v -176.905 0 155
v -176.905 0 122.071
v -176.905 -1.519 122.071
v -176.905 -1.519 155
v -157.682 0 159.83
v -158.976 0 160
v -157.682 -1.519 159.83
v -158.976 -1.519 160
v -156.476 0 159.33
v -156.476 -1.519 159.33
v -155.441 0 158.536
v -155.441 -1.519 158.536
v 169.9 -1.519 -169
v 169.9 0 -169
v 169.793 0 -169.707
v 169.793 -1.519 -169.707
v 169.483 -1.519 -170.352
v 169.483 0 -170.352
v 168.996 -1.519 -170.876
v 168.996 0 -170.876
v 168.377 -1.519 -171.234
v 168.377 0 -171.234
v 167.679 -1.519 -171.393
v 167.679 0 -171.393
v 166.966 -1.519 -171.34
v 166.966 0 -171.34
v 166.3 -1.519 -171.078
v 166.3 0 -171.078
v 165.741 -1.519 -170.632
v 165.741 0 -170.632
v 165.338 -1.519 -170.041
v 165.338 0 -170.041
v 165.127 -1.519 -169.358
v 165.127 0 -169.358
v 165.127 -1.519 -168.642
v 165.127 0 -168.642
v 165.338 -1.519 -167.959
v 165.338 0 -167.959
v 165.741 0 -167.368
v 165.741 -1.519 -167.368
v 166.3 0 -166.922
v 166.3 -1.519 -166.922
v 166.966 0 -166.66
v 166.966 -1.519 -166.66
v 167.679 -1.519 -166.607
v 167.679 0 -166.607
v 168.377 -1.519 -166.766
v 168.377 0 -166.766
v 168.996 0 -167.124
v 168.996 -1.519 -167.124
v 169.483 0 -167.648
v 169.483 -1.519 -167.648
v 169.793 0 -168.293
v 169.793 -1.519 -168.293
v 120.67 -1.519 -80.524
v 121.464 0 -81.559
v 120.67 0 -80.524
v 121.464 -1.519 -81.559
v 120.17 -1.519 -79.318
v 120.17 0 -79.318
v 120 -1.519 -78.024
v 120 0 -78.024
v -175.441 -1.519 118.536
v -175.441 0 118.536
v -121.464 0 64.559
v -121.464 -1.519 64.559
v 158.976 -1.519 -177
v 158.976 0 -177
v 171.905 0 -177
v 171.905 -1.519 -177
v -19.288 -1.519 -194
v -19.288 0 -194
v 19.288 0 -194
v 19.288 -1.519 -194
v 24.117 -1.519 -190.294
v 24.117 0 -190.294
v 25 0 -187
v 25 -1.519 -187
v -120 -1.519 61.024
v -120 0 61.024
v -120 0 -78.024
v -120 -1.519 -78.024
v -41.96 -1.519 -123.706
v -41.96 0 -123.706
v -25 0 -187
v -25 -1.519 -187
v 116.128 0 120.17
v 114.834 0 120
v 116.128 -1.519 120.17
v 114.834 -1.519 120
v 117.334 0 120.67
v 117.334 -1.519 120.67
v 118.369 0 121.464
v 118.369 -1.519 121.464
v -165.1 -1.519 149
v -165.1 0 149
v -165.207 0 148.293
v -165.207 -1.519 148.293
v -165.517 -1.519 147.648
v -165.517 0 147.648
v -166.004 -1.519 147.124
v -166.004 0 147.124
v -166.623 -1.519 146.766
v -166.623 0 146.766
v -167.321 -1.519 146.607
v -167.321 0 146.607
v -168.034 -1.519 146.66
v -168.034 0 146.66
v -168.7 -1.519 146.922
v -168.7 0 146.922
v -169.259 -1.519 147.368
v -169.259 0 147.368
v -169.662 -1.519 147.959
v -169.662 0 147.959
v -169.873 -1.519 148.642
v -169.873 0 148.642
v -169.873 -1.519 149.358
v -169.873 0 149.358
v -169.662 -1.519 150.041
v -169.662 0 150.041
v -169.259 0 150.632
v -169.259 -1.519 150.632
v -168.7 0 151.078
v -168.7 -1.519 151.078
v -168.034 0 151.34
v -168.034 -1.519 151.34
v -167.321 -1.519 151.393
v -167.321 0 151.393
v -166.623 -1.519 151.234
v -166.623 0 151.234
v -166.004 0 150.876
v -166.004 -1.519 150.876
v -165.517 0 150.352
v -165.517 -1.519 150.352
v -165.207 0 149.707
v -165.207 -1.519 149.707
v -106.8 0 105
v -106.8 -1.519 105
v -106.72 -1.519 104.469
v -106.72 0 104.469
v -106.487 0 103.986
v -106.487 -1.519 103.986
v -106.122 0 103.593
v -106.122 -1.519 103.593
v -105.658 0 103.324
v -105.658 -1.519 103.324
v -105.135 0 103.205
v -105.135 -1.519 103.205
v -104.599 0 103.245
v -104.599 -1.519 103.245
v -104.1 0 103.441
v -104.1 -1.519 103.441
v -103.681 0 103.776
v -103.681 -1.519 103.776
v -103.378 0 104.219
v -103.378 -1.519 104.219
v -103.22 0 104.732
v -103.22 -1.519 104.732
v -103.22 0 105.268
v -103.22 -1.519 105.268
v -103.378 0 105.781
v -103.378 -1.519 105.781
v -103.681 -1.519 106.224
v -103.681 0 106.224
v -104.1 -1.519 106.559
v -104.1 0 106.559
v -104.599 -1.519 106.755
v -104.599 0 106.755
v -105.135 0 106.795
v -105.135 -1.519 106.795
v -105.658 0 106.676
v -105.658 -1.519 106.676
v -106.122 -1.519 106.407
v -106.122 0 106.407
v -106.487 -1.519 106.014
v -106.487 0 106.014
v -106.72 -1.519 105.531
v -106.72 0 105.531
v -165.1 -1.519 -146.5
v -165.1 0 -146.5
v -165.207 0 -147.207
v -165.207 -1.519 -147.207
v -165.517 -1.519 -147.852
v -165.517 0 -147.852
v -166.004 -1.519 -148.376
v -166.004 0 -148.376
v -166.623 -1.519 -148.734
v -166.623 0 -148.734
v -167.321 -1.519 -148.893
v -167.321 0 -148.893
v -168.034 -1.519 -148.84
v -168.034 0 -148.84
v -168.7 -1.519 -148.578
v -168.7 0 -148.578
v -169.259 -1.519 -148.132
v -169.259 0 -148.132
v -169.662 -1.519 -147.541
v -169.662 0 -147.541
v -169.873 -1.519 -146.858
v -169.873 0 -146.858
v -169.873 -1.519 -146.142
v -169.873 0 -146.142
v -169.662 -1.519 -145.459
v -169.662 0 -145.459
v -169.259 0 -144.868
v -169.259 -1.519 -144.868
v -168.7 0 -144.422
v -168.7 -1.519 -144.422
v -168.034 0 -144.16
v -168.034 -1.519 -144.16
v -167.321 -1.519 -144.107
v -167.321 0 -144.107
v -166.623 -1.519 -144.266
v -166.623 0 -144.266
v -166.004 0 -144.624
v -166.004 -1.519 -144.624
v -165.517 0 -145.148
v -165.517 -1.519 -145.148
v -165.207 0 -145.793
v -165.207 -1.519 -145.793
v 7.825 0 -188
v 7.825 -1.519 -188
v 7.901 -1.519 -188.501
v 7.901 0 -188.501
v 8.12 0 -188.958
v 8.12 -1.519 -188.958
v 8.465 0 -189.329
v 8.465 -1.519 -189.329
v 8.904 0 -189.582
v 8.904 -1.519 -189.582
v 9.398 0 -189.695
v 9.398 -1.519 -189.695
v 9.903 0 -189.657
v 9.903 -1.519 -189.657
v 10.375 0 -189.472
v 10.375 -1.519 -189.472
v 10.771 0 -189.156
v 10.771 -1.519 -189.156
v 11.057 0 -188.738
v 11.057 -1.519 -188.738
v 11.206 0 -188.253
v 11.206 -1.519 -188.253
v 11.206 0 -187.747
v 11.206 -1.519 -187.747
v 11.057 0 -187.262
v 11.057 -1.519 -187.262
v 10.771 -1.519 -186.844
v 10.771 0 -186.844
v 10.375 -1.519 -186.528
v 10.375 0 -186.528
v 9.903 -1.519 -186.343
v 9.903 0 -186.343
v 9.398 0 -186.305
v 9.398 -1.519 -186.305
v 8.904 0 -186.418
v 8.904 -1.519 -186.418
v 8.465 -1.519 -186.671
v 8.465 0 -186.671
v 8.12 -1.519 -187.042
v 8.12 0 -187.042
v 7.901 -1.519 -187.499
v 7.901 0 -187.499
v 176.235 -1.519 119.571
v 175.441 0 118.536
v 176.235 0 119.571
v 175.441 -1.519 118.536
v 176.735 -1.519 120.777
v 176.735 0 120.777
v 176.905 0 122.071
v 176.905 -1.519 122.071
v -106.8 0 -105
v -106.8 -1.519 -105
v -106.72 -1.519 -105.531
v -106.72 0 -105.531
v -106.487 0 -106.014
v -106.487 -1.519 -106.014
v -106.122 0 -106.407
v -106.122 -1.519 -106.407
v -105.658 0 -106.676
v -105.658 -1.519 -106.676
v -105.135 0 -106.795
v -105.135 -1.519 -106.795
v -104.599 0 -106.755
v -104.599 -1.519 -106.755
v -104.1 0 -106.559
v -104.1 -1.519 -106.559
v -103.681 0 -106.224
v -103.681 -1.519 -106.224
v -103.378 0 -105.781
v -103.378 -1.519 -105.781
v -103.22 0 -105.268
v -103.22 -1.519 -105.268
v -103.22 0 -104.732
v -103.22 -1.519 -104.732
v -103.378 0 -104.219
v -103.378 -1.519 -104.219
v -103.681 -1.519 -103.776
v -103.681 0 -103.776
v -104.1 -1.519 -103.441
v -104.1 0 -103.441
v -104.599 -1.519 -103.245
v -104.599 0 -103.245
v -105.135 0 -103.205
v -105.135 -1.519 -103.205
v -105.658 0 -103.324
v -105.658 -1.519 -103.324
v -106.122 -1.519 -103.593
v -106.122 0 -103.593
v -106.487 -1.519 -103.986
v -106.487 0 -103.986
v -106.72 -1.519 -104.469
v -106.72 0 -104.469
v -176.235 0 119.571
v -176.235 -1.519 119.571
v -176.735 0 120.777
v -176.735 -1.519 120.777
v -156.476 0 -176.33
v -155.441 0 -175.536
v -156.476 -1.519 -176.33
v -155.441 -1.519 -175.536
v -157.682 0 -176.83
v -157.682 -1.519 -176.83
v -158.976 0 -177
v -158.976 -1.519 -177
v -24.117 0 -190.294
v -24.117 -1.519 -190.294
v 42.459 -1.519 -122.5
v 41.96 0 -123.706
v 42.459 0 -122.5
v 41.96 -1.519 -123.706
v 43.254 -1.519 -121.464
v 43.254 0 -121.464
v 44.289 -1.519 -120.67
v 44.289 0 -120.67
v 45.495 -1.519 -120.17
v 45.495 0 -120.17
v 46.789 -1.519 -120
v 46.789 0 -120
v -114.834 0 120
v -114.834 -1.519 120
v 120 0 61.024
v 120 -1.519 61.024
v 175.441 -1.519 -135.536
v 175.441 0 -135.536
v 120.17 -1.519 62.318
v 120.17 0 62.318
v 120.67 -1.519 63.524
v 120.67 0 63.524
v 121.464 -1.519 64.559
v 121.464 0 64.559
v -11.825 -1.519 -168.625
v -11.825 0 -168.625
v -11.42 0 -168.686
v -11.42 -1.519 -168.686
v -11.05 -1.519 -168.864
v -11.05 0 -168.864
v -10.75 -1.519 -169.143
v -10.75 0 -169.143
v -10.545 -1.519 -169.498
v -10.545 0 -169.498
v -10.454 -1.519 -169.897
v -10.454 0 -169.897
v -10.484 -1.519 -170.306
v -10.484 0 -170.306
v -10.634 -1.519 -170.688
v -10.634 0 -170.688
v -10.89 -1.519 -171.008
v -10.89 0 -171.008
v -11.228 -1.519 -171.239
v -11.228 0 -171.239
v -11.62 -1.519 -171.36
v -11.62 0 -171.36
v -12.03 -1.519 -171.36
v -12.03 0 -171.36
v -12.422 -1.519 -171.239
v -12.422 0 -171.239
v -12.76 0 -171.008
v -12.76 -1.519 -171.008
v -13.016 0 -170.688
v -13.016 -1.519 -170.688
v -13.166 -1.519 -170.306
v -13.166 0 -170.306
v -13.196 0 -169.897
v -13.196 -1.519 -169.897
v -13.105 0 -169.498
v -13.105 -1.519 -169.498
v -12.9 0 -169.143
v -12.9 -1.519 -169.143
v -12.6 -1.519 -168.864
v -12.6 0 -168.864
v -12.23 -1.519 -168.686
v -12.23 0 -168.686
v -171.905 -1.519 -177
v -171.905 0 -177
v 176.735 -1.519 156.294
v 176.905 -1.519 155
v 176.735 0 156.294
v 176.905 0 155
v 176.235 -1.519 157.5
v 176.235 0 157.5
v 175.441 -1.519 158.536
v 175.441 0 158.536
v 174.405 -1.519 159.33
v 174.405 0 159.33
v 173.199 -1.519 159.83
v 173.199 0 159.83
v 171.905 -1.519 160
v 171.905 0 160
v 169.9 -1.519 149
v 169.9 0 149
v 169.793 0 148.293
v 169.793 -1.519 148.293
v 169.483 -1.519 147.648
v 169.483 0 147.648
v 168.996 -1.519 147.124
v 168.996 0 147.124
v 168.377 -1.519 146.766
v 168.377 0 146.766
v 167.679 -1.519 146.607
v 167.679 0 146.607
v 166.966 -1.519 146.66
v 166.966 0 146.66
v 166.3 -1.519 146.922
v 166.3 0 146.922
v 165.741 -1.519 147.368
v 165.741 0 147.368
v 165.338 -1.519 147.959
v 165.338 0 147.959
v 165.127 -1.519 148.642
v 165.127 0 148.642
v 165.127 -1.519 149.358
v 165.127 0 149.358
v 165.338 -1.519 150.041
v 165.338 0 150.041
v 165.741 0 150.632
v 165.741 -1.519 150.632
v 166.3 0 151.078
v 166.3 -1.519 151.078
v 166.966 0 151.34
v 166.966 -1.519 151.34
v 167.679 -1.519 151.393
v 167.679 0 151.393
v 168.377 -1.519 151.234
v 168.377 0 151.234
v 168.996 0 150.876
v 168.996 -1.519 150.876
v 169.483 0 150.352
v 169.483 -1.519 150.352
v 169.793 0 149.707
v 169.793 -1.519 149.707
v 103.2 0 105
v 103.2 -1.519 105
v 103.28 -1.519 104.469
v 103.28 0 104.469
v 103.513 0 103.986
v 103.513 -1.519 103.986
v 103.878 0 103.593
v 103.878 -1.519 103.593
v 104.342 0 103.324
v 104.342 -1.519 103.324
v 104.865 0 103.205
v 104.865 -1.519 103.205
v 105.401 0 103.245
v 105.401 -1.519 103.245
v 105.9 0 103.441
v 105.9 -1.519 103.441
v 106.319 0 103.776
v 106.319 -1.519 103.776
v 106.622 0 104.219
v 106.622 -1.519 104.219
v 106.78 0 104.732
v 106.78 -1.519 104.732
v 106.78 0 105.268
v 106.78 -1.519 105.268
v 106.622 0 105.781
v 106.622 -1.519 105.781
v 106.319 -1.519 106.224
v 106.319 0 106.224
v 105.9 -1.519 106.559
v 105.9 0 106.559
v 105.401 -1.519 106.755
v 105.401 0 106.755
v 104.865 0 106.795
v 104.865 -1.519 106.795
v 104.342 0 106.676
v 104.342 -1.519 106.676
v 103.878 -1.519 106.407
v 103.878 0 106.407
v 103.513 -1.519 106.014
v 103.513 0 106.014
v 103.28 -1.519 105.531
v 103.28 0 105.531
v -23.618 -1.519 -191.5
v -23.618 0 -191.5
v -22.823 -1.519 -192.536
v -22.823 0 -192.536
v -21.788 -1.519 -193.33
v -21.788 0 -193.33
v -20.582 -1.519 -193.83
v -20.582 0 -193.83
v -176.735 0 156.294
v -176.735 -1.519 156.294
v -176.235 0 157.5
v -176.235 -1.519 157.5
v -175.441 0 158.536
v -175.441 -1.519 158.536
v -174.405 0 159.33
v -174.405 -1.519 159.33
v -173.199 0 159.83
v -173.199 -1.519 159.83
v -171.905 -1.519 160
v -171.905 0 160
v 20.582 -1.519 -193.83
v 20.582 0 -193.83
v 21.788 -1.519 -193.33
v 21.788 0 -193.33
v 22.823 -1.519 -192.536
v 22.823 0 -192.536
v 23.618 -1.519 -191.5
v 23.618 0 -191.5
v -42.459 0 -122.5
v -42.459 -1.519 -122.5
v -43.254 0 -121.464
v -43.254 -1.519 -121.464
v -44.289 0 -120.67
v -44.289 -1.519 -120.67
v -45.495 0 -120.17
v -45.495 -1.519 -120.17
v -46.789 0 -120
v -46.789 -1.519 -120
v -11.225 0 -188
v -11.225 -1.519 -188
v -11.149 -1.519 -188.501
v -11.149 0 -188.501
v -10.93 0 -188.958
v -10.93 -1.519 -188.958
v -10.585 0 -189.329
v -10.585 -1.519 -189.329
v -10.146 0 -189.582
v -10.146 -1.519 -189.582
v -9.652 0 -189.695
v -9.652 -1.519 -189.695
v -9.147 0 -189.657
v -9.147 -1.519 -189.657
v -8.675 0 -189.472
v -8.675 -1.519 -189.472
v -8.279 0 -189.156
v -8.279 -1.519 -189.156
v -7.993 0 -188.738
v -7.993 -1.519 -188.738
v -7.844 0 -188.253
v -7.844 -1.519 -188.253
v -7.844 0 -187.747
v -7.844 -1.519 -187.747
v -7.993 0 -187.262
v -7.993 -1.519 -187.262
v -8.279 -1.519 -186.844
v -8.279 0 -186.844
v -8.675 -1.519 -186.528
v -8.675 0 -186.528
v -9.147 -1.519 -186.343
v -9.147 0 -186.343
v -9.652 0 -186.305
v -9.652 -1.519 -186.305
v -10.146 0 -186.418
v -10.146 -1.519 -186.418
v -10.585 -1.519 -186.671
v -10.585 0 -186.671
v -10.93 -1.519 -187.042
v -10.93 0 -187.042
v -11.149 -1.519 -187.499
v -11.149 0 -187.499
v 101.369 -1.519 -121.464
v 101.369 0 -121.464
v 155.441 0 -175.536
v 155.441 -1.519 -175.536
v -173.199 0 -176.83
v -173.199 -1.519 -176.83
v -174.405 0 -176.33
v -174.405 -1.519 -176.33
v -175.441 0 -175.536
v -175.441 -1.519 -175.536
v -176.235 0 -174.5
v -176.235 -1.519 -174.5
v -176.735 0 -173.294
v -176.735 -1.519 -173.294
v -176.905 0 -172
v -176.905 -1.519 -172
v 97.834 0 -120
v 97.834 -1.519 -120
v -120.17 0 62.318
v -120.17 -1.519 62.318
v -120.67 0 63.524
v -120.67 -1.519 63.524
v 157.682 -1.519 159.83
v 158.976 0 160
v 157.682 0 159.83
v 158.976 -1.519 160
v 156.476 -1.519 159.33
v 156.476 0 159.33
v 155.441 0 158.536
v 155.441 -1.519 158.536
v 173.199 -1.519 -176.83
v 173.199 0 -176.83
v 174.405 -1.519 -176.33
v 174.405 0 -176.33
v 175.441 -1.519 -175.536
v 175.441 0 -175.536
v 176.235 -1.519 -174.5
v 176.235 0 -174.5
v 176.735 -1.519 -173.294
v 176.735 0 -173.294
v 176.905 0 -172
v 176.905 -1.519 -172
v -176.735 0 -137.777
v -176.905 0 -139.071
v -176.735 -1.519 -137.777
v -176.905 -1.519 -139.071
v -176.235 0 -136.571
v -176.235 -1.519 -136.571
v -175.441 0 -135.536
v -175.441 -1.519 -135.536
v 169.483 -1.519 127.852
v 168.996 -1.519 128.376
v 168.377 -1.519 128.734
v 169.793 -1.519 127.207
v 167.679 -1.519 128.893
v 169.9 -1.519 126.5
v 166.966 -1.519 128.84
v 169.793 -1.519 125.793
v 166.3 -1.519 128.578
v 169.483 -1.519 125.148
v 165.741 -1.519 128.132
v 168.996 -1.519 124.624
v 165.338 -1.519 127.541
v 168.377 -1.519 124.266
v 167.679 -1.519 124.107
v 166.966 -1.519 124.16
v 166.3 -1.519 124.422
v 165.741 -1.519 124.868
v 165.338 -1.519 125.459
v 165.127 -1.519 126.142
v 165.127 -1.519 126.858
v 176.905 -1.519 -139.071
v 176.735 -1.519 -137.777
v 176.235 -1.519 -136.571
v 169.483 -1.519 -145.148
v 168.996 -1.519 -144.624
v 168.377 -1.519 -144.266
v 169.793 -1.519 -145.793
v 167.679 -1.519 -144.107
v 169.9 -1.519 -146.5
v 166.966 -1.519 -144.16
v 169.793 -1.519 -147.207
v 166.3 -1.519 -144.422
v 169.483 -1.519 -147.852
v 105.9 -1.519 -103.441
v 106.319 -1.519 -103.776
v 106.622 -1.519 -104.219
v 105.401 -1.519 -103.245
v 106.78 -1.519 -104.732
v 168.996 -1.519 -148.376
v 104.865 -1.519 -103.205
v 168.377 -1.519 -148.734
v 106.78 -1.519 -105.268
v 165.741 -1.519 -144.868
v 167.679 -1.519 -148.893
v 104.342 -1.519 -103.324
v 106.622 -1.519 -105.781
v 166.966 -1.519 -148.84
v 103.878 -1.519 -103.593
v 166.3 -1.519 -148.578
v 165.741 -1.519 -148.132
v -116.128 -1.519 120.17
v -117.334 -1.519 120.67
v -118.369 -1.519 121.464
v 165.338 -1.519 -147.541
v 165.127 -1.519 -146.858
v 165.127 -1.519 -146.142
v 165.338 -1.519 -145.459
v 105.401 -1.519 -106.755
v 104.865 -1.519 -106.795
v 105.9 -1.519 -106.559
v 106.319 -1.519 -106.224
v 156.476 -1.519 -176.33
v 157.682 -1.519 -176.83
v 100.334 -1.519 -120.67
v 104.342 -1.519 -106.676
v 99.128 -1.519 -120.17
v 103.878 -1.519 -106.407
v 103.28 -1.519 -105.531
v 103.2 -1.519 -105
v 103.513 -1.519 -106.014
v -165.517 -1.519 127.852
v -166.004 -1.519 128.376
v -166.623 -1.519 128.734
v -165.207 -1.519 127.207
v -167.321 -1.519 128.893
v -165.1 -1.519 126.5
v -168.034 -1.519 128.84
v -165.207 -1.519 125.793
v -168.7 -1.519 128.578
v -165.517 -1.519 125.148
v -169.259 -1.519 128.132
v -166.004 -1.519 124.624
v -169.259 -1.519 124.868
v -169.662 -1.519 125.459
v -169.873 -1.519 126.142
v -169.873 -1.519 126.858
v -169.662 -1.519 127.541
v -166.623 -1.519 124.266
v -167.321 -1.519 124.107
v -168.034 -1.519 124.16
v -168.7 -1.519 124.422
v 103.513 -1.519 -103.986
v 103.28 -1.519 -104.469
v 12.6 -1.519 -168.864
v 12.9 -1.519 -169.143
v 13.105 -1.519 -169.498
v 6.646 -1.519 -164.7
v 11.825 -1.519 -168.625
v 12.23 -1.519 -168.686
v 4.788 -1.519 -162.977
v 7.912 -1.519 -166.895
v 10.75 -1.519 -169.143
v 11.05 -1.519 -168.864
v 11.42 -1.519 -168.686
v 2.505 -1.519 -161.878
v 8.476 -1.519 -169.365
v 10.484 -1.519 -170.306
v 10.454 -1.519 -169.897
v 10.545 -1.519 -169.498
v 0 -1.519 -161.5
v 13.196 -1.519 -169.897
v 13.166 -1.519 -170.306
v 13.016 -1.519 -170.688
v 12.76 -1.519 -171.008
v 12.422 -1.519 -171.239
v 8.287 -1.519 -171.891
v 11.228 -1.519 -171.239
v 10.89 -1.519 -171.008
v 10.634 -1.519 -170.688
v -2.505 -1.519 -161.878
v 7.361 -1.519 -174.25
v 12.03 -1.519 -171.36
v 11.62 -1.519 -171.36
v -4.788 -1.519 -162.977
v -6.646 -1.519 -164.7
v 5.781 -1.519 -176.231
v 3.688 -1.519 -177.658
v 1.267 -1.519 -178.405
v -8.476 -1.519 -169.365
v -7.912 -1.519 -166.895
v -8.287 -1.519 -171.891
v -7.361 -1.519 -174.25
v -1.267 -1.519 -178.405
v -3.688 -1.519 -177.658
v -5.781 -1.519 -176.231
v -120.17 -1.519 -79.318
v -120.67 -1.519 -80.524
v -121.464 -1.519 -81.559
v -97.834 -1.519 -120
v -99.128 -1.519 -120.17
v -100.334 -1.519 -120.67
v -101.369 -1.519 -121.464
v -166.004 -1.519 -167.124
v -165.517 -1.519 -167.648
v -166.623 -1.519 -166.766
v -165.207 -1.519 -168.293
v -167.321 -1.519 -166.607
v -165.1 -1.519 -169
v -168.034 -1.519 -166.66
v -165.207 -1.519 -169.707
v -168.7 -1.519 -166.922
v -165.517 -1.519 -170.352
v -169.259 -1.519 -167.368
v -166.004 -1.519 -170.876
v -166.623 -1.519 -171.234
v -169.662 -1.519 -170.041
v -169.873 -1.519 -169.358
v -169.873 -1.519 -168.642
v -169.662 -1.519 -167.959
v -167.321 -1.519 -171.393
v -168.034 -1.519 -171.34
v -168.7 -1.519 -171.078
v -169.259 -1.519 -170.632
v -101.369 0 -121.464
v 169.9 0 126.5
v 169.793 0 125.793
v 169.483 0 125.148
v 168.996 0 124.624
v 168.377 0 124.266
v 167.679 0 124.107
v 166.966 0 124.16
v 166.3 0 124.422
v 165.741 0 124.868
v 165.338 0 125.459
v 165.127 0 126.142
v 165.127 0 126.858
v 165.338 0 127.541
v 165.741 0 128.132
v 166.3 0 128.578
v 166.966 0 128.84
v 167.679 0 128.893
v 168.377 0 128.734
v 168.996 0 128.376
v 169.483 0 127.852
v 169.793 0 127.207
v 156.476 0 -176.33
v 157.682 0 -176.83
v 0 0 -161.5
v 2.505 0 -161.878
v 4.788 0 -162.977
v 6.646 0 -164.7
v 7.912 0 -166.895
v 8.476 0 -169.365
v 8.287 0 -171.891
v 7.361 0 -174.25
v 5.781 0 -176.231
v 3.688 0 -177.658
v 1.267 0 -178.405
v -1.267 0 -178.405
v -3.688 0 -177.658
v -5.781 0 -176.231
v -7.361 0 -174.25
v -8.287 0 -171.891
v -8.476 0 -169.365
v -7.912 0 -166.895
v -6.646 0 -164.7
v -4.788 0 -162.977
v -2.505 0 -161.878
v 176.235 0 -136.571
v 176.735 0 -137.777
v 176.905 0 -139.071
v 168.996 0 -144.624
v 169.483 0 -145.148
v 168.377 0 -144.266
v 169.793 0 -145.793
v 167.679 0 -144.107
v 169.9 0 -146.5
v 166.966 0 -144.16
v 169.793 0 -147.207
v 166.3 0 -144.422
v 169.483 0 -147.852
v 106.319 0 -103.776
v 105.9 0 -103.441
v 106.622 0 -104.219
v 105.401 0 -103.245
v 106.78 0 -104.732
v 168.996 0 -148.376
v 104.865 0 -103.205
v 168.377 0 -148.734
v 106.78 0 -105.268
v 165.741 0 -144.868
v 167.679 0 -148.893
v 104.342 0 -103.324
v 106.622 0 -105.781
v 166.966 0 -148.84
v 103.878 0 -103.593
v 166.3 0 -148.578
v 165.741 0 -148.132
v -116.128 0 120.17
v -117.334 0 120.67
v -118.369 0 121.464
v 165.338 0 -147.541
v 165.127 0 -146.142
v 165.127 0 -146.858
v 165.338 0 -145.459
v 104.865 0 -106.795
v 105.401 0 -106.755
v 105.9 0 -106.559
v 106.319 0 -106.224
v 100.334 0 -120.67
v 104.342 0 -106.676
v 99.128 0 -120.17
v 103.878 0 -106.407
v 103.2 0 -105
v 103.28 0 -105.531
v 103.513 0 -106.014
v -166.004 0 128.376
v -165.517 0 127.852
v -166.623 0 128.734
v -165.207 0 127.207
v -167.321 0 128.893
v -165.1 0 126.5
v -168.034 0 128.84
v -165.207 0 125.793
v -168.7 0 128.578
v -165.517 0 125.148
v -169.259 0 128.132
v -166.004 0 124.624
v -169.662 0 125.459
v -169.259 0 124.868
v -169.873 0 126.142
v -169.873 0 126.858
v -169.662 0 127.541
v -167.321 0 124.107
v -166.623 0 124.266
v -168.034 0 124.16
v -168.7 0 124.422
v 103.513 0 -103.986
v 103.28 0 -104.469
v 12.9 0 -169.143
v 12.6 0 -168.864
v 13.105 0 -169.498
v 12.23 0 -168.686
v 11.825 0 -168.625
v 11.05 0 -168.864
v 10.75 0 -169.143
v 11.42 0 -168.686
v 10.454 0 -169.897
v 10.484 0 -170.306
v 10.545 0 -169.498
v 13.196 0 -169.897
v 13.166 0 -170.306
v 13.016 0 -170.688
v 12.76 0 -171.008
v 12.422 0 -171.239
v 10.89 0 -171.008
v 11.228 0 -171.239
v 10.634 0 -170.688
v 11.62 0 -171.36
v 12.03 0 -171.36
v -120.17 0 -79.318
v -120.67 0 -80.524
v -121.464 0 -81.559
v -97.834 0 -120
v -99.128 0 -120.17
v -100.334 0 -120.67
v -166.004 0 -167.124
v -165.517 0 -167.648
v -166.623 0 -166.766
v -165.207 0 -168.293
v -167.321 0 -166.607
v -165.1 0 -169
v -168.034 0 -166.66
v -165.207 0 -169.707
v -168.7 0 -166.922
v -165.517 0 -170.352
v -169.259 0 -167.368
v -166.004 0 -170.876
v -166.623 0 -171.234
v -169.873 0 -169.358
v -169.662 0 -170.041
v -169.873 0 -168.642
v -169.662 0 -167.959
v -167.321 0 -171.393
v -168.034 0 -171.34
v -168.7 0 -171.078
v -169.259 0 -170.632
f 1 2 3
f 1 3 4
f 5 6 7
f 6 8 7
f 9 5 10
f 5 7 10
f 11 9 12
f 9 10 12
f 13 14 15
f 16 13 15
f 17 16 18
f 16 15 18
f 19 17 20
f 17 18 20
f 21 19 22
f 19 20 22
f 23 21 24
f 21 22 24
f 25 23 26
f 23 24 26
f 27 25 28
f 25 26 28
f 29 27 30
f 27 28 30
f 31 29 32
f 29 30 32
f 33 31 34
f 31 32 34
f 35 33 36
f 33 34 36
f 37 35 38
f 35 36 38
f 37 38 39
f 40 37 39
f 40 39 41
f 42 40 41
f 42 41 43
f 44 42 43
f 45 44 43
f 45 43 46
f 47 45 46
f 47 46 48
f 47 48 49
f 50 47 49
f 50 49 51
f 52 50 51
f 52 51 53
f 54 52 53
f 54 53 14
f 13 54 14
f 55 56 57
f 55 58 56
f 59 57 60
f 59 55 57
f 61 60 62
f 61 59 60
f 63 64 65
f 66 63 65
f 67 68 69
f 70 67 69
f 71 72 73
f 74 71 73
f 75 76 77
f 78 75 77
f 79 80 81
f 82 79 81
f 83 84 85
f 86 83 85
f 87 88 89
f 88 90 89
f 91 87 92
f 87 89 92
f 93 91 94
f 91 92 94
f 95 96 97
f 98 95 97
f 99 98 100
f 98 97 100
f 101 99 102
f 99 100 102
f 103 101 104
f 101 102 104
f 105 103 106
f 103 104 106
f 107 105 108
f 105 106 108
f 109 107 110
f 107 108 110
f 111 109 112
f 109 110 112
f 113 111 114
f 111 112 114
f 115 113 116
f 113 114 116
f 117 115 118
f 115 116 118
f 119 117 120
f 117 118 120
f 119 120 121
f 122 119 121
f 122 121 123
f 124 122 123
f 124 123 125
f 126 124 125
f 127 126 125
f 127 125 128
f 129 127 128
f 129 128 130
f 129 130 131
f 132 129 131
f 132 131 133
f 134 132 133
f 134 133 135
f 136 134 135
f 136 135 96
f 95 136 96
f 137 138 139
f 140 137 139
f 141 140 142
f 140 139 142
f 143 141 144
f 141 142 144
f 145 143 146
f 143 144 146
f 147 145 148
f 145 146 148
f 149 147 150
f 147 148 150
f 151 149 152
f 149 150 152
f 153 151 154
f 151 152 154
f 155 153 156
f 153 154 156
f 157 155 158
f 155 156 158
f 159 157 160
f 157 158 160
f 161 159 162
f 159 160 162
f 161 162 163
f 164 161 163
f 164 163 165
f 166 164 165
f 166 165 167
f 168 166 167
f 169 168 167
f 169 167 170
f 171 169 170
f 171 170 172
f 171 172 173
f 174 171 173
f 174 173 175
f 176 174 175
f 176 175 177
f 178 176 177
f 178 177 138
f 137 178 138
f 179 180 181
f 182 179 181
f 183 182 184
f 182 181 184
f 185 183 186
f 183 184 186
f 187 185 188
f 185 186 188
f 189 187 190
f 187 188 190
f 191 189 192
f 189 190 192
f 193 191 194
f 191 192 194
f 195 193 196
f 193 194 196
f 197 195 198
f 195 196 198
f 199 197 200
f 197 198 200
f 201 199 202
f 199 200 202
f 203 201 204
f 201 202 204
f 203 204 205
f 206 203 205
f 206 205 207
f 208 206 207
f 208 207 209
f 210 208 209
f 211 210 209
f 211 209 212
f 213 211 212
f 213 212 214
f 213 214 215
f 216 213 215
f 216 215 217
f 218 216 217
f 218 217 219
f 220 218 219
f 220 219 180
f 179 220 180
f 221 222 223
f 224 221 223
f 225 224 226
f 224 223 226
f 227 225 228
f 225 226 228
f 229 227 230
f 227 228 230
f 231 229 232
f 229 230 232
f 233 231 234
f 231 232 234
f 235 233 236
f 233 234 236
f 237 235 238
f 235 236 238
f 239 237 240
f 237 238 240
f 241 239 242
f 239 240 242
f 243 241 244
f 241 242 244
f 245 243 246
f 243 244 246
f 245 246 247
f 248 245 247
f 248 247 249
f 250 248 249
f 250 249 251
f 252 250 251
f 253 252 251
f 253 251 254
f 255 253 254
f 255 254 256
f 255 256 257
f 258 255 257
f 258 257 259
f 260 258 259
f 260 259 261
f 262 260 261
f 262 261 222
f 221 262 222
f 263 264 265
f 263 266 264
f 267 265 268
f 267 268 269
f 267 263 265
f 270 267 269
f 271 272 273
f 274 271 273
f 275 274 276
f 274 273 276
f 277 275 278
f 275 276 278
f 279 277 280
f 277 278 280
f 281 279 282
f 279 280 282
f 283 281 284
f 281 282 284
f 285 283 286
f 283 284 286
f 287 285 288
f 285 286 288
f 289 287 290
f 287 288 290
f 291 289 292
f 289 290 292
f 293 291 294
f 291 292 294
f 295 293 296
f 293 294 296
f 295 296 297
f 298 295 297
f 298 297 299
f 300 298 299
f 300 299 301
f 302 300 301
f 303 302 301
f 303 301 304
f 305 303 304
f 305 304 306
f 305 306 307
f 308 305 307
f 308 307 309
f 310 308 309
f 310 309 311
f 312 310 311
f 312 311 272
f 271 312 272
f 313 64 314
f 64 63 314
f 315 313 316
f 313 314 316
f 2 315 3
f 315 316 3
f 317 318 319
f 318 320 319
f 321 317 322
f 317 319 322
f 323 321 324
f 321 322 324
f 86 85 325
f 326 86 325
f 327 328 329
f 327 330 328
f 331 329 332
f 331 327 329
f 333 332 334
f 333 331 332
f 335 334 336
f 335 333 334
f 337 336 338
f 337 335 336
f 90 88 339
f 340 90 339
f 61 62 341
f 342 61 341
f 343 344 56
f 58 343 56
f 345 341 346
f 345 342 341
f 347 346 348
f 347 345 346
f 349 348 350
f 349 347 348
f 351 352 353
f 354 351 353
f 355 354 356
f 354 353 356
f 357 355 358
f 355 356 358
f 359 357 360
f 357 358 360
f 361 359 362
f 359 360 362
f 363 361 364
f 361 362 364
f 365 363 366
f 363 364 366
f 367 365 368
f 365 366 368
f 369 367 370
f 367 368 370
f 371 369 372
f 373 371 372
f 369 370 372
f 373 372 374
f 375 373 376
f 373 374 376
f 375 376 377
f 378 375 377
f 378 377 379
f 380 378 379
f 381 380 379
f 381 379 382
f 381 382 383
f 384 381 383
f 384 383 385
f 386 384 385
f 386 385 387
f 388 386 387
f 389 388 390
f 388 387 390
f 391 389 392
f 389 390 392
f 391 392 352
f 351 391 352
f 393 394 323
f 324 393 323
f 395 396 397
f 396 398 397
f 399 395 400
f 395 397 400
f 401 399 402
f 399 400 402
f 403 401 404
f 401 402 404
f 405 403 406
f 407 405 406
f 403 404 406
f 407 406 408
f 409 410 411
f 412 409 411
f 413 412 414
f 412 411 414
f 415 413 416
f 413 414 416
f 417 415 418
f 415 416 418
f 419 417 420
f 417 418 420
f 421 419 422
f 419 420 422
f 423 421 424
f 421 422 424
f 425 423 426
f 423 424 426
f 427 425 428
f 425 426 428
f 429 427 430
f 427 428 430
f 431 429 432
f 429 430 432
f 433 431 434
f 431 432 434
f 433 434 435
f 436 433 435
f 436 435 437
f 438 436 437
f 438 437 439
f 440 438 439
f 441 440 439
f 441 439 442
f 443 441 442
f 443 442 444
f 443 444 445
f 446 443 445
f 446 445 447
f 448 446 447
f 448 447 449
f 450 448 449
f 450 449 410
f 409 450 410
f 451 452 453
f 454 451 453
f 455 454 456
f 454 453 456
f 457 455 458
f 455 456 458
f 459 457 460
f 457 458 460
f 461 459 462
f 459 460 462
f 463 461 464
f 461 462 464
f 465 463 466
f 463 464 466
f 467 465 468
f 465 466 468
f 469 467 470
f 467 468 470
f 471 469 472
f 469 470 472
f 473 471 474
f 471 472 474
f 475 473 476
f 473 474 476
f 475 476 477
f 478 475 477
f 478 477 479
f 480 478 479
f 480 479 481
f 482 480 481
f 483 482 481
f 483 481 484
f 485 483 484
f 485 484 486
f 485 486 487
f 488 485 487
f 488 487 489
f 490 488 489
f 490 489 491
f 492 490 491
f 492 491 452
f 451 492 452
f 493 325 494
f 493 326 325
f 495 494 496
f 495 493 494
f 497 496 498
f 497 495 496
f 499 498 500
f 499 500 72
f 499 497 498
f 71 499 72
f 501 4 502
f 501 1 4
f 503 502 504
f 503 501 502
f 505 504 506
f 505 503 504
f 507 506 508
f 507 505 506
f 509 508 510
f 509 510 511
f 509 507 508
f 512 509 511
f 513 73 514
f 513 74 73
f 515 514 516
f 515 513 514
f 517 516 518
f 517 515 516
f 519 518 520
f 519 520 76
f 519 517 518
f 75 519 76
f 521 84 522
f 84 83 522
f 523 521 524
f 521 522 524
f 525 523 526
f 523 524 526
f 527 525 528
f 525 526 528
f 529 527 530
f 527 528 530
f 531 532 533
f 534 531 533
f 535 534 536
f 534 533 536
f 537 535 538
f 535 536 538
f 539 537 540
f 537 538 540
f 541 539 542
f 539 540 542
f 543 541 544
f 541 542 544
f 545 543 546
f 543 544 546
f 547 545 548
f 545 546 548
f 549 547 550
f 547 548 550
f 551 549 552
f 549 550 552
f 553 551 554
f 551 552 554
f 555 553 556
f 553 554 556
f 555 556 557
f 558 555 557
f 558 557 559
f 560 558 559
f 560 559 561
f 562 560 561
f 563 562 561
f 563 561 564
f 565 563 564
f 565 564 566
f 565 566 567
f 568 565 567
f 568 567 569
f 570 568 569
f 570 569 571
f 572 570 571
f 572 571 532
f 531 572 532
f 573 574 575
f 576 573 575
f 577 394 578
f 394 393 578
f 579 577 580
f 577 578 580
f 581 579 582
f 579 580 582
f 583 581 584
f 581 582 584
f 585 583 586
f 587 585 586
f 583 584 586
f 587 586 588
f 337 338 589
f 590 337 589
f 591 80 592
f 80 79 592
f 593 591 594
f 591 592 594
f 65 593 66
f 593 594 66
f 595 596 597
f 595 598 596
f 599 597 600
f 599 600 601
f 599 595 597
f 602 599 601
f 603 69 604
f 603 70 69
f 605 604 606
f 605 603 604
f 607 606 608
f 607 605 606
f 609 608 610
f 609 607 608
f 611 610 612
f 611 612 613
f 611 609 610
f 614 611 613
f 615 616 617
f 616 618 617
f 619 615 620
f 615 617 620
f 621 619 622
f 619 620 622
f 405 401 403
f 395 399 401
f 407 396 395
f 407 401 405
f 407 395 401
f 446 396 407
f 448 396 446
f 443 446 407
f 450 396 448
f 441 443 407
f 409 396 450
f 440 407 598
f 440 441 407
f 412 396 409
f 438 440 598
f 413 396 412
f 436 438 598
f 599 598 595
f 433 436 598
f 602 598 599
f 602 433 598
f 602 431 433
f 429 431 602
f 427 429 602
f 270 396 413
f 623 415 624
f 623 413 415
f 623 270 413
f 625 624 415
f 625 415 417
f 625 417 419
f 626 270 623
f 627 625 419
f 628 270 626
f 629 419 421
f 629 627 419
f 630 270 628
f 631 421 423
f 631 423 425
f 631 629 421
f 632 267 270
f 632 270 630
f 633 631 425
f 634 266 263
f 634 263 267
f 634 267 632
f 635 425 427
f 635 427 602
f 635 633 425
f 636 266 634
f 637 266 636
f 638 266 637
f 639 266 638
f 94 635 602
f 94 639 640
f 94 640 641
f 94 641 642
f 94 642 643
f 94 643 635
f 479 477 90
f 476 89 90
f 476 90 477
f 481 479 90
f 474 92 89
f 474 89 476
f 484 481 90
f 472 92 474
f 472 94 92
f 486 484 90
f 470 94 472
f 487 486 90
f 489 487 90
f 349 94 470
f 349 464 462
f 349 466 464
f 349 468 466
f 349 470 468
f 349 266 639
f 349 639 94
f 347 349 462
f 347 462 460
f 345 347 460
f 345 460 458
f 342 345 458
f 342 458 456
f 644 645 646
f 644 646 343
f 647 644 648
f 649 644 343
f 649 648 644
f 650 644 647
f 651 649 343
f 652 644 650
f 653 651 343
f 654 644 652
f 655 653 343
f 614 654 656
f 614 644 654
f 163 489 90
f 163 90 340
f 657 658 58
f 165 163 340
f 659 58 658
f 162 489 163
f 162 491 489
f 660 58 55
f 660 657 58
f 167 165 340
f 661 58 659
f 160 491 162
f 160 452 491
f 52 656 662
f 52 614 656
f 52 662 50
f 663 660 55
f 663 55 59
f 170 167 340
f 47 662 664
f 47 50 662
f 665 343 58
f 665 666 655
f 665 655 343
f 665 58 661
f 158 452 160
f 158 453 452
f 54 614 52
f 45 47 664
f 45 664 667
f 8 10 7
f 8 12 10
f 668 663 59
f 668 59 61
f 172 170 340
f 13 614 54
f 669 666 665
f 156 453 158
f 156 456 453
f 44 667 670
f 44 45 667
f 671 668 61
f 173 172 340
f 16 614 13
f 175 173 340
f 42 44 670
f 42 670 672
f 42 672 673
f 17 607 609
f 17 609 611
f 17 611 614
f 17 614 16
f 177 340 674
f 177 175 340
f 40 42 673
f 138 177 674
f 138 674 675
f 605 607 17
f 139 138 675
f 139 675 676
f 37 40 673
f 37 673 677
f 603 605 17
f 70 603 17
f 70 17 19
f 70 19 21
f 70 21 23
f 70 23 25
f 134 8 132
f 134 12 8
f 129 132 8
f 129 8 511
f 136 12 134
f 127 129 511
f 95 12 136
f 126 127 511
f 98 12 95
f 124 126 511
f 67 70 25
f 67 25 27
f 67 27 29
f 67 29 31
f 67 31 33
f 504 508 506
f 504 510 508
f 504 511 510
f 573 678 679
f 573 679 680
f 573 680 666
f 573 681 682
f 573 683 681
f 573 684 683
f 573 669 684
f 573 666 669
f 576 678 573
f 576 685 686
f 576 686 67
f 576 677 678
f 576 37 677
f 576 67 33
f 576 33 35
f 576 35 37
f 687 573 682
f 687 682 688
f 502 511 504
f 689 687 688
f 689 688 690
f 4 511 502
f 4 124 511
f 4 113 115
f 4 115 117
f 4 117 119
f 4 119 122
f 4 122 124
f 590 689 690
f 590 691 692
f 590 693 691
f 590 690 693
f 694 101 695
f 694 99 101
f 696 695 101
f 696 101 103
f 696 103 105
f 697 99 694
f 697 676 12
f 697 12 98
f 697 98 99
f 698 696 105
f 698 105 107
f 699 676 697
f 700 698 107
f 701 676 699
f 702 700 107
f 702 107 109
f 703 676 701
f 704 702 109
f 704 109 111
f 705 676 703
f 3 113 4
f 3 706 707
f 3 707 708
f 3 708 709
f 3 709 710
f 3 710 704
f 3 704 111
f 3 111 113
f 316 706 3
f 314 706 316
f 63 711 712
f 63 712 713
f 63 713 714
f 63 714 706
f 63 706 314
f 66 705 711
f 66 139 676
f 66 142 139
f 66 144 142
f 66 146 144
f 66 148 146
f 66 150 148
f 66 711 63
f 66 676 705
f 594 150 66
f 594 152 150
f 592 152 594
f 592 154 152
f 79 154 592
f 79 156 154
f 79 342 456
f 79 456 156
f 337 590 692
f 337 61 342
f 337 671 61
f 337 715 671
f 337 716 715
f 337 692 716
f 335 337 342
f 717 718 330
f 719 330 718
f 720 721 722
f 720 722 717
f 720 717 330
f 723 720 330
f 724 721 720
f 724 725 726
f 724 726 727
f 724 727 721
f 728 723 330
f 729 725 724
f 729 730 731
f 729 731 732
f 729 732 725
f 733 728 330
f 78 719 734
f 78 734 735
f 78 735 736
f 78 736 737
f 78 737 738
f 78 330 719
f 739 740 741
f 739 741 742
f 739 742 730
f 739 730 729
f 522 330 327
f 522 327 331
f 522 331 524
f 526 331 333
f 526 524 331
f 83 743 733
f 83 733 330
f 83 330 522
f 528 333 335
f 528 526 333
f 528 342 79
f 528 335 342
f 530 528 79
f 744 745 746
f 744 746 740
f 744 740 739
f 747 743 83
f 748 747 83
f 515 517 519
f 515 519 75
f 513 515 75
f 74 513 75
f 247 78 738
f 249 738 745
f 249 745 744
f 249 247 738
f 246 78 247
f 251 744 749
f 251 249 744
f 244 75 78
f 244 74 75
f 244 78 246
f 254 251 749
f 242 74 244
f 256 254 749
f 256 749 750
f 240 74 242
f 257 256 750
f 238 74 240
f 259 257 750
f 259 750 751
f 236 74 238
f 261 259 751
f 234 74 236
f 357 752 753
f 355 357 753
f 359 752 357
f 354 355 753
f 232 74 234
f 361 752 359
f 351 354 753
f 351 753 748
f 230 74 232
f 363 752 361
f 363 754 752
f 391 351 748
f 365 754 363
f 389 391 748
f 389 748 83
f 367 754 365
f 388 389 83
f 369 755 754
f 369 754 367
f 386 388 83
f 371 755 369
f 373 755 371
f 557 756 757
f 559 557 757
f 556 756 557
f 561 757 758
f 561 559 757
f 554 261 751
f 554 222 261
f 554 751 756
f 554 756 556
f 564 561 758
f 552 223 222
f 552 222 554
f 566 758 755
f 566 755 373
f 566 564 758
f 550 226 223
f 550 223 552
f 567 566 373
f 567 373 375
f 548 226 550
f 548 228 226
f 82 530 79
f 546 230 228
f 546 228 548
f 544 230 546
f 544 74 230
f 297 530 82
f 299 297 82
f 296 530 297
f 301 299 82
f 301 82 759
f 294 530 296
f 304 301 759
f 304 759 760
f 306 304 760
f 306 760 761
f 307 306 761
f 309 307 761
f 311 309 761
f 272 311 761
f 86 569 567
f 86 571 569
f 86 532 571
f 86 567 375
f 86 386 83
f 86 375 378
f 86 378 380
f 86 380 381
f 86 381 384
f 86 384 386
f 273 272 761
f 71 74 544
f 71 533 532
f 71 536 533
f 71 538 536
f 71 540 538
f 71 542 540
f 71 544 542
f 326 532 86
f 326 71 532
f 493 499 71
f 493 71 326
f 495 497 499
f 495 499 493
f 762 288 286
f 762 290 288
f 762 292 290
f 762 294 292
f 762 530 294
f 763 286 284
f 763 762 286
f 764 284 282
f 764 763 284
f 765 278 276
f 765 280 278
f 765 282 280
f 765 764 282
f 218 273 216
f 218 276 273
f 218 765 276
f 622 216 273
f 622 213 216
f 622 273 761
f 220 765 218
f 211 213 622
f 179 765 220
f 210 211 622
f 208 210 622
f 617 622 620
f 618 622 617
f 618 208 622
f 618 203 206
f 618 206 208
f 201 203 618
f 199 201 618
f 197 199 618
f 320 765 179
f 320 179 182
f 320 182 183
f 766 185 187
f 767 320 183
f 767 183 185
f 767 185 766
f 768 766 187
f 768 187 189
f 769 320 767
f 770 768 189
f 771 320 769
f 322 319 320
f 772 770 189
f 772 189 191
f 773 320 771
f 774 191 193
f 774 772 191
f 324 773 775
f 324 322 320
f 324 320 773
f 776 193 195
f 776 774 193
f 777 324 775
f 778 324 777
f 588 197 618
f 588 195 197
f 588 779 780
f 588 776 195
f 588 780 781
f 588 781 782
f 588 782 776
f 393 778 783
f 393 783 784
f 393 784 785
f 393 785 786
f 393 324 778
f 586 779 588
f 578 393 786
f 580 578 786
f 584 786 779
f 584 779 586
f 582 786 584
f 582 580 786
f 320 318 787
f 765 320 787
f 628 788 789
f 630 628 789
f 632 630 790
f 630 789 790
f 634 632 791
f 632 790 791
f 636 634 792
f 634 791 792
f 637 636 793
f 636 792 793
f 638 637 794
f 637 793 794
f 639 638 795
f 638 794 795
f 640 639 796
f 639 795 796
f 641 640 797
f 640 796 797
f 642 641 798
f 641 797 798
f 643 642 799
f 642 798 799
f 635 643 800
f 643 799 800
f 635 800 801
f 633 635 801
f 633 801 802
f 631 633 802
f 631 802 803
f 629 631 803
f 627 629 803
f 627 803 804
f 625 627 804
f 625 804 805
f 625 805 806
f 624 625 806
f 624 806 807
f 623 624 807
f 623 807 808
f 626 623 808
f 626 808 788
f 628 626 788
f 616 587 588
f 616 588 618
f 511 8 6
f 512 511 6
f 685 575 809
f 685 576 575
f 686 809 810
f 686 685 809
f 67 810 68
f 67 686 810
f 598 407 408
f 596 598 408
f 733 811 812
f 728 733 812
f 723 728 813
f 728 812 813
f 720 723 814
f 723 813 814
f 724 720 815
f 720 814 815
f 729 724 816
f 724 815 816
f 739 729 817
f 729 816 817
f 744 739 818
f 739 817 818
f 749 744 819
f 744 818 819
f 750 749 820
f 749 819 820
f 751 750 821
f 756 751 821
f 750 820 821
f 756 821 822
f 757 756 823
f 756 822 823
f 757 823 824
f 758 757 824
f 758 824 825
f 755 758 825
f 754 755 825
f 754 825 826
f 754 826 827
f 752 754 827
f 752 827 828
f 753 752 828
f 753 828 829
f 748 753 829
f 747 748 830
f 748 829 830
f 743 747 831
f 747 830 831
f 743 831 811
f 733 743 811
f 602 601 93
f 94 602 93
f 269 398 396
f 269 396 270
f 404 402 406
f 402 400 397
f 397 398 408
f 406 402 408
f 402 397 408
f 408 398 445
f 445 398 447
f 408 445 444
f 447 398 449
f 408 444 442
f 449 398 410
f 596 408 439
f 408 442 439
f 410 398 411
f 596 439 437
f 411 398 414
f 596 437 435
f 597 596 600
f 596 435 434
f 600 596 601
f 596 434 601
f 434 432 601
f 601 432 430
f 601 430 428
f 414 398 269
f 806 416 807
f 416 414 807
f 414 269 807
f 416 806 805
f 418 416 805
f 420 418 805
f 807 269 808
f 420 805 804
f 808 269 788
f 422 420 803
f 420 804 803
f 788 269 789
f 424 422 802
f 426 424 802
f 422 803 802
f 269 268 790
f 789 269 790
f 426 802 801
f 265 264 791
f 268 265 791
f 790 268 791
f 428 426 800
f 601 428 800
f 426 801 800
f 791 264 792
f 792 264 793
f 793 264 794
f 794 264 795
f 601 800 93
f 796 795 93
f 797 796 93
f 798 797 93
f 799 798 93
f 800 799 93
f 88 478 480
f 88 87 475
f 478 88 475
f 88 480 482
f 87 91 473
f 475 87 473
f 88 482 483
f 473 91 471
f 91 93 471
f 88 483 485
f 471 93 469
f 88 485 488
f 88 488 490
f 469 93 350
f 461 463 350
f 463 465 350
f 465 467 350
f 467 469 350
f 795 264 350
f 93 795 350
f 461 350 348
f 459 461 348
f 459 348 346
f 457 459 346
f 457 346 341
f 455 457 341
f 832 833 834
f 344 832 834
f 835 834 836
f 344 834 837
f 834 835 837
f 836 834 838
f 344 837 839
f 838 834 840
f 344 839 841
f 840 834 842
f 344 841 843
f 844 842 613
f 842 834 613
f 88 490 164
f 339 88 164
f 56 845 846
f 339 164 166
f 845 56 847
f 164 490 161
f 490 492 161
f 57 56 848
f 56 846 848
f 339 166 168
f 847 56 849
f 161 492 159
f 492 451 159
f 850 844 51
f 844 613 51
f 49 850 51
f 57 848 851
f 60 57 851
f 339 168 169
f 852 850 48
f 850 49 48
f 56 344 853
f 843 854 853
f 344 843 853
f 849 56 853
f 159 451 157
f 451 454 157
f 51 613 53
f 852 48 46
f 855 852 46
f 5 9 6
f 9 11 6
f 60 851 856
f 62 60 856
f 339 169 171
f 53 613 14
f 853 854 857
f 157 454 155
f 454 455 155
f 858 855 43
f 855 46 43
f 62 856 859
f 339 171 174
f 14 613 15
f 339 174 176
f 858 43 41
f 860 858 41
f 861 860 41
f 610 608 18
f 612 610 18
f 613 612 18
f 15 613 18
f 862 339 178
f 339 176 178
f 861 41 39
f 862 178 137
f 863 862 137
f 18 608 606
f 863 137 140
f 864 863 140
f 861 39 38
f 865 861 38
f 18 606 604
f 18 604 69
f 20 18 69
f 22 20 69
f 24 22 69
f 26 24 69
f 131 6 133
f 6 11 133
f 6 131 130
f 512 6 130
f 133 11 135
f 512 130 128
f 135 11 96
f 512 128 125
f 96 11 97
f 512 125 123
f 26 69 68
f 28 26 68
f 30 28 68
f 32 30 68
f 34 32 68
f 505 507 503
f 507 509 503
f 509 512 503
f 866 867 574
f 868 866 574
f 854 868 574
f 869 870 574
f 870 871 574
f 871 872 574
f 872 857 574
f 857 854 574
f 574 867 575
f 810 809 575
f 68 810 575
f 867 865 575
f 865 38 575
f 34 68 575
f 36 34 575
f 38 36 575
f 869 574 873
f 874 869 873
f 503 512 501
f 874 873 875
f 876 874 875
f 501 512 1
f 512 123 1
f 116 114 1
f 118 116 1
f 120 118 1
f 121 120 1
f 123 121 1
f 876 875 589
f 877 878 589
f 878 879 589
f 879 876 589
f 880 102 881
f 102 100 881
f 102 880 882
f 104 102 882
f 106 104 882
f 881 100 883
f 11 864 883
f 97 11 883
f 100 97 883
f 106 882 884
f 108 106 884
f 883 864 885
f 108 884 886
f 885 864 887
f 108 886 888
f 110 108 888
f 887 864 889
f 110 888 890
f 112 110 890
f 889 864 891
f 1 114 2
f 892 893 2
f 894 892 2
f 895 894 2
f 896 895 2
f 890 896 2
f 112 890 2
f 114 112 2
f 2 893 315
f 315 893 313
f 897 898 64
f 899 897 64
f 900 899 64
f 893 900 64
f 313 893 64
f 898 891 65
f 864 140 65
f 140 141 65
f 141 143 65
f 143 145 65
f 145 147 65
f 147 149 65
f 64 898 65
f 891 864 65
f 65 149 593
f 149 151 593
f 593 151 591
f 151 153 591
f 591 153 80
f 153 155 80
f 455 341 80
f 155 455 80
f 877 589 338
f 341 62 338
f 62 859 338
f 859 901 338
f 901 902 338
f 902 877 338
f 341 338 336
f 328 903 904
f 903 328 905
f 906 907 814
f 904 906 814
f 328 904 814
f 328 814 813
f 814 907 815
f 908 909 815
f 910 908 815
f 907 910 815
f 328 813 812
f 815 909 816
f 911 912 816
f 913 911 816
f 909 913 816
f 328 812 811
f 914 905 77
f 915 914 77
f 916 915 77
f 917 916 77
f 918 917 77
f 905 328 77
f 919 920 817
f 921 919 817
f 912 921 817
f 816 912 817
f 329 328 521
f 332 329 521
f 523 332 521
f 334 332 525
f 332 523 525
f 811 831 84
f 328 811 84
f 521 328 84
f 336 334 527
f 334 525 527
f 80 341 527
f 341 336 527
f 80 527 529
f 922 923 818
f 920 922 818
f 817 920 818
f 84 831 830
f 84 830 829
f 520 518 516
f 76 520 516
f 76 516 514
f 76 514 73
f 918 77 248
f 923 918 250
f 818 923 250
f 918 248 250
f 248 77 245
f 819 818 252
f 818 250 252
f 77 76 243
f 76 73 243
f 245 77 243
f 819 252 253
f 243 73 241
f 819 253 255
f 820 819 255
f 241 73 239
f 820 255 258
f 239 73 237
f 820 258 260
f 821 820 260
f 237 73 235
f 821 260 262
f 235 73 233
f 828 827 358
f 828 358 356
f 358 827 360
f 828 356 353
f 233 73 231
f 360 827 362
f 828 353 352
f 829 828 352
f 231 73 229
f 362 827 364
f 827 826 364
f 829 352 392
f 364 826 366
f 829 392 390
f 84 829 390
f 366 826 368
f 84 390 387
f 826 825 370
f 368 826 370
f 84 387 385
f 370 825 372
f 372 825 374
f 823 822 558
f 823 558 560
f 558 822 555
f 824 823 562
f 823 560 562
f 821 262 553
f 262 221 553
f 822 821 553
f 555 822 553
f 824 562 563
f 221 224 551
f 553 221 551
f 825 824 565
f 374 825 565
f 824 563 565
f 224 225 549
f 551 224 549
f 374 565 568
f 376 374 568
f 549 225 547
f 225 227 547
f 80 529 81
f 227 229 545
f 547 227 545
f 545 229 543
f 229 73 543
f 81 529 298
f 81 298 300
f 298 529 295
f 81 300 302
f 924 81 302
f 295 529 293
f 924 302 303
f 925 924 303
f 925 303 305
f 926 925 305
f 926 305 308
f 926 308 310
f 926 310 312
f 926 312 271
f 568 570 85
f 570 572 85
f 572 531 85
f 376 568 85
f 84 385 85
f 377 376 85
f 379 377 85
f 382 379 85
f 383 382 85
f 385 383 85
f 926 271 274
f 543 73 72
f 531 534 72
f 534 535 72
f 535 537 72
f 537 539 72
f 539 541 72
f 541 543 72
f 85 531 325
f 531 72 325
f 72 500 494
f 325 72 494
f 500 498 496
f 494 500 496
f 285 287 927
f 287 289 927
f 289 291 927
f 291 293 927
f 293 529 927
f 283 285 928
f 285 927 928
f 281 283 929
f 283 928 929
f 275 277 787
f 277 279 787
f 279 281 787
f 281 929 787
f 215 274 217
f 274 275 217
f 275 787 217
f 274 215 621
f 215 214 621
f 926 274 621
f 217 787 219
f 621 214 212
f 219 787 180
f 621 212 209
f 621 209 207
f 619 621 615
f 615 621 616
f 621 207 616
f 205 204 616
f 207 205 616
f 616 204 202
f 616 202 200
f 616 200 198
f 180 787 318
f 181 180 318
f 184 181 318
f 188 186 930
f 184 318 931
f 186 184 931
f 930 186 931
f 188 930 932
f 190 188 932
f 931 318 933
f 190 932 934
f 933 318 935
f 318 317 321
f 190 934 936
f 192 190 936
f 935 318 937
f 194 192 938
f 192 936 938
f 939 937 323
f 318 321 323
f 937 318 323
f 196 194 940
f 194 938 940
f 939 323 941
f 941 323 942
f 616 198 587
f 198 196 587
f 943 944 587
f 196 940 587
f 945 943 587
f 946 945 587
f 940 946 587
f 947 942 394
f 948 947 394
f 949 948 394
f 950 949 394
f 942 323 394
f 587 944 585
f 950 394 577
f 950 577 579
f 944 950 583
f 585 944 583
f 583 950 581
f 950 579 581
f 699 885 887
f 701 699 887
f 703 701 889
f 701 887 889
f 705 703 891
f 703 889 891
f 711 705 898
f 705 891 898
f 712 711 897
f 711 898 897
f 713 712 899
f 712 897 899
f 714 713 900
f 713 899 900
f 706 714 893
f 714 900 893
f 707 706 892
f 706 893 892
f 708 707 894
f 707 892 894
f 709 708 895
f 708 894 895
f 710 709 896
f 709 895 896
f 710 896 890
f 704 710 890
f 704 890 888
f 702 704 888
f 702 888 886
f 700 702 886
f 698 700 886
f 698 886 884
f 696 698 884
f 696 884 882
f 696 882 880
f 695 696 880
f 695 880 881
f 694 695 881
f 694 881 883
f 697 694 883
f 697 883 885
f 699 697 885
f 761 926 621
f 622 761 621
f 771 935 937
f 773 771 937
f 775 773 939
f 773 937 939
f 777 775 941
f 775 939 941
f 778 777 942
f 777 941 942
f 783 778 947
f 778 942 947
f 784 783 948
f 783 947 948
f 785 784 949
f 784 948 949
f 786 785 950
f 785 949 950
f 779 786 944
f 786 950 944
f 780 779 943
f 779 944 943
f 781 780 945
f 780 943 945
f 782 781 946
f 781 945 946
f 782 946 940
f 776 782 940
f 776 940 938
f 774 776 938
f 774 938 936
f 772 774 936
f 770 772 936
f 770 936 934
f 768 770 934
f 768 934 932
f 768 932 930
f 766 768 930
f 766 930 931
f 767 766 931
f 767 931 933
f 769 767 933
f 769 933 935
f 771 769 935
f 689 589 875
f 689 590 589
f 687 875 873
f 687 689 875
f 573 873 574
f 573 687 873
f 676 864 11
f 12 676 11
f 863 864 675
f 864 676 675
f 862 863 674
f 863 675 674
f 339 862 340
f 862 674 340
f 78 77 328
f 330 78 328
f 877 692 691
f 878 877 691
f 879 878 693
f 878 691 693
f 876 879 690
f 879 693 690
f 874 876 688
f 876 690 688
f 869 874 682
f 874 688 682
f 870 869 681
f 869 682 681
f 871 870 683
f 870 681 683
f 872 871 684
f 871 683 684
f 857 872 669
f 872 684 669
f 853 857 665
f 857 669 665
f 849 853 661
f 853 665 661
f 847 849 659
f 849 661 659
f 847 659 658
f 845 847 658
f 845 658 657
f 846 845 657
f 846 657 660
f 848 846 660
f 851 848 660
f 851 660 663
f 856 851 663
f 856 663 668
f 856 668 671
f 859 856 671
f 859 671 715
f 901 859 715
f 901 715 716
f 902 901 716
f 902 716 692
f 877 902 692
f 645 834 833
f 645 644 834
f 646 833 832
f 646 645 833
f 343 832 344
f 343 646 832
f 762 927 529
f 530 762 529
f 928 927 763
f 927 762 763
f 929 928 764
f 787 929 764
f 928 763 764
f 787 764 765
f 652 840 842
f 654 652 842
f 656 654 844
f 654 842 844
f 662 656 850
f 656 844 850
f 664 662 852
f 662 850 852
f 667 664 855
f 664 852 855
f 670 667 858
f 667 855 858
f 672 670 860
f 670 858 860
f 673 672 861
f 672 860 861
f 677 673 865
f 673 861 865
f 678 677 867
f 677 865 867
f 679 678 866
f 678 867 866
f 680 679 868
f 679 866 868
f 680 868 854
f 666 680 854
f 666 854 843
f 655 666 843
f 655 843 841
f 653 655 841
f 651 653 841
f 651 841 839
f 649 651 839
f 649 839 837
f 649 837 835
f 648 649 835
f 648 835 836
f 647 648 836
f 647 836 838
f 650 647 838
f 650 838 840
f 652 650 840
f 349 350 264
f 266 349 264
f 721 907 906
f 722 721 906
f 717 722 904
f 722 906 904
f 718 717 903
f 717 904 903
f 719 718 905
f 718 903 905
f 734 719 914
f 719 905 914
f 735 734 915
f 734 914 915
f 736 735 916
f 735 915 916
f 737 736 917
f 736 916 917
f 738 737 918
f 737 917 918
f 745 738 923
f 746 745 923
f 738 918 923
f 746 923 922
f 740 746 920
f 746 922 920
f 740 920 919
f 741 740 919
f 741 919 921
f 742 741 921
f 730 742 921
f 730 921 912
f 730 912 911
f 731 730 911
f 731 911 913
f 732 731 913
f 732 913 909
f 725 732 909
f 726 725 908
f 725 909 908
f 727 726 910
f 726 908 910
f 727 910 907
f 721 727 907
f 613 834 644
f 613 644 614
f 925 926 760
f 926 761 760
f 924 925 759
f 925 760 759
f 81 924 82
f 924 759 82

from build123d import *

# Parameters (mm, degrees)
SKETCH1_W            = 350
SKETCH1_H            = 347
BASE_FLANGE1_DEPTH   = 1.51892
M3_CLEARANCE_HOLE1_D = 3.6
M4_CLEARANCE_HOLE1_D = 4.8
SKETCH13_R           = 8.5
SKETCH13_R_2         = 1.375
CUT_EXTRUDE1_DEPTH   = 1.51892
SKETCH41_W           = 347
SKETCH41_H           = 1.51892
BOSS_EXTRUDE4_DEPTH  = 1.905
SKETCH42_W           = 347
SKETCH42_H           = 1.51892
BOSS_EXTRUDE5_DEPTH  = 1.905
CUT_EXTRUDE2_DEPTH   = 1.51892
BOSS_EXTRUDE6_DEPTH  = 1.51892
CLEARANCE_HOLE2_D    = 3.4
FILLET2_R            = 5


# Sheet-metal steps are written as plain solids
with BuildPart() as part:
    # Sketch1 → Base-Flange1 (new body)
    with BuildSketch(Plane(origin=(0, 0, 0), x_dir=(1, 0, 0), z_dir=(0, 1, 0))):
        with Locations((0, 13.5)):
            Rectangle(SKETCH1_W, SKETCH1_H)
    extrude(amount=-BASE_FLANGE1_DEPTH)

    # M3 Clearance Hole1 (through all)
    with Locations(Plane(origin=(0, 0, 0), x_dir=(1, 0, 0), z_dir=(0, 1, 0))):
        with Locations((-105, 105), (105, 105), (105, -105), (-105, -105)):
            Hole(M3_CLEARANCE_HOLE1_D / 2)

    # M4 Clearance Hole1 (through all)
    with Locations(Plane(origin=(0, -1.51892, 0), x_dir=(-1, 0, 0), z_dir=(0, -1, 0))):
        with Locations((167.5, 146.5), (167.5, 169), (-167.5, 146.5), (-167.5, 169), (-167.5, -149), (-167.5, -126.5), (167.5, -149), (167.5, -126.5)):
            Hole(M4_CLEARANCE_HOLE1_D / 2)

    # Sketch13 → Cut-Extrude1 (cut)
    with BuildSketch(Plane(origin=(0, 0, 0), x_dir=(1, 0, 0), z_dir=(0, 1, 0))):
        with Locations(Location((0, 170, 0), (0, 0, 270))):
            Circle(SKETCH13_R)
        with Locations(Location((-11.825, 170, 0), (0, 0, 270))):
            Circle(SKETCH13_R_2)
        with Locations(Location((11.825, 170, 0), (0, 0, 270))):
            Circle(SKETCH13_R_2)
    extrude(amount=-CUT_EXTRUDE1_DEPTH, mode=Mode.SUBTRACT)

    # Sketch41 → Boss-Extrude4 (add)
    with BuildSketch(Plane(origin=(175, 0, 0), x_dir=(0, 0, -1), z_dir=(1, 0, 0))):
        with Locations((13.5, -0.75946)):
            Rectangle(SKETCH41_W, SKETCH41_H)
    extrude(amount=BOSS_EXTRUDE4_DEPTH)

    # Sketch42 → Boss-Extrude5 (add)
    with BuildSketch(Plane.ZY.offset(175)):
        with Locations((-13.5, -0.75946)):
            Rectangle(SKETCH42_W, SKETCH42_H)
    extrude(amount=BOSS_EXTRUDE5_DEPTH)

    # Sketch43 → Cut-Extrude2 (cut)
    with BuildSketch(Plane(origin=(0, 0, 0), x_dir=(1, 0, 0), z_dir=(0, 1, 0))):
        Polygon((-176.905, -120), (-120, -63.095), (-120, 80.095), (-176.905, 137), align=None)
        Polygon((-156.905, 177), (-99.905, 120), (-42.952595893, 120), (-25, 187), (-176.905, 187), (-176.905, 177), align=None)
        Polygon((25, 187), (42.952595893, 120), (99.905, 120), (156.905, 177), (176.905, 177), (176.905, 187), align=None)
        Polygon((120, 80.095), (120, -63.095), (176.905, -120), (176.905, 137), align=None)
        Polygon((116.905, -120), (-116.905, -120), (-156.905, -160), (156.905, -160), align=None)
    extrude(amount=-CUT_EXTRUDE2_DEPTH, mode=Mode.SUBTRACT)

    # Sketch45 → Boss-Extrude6 (add)
    with BuildSketch(Plane(origin=(0, 0, 0), x_dir=(1, 0, 0), z_dir=(0, 1, 0))):
        Polygon((-25, 187), (-23.124355653, 194), (23.124355653, 194), (25, 187), align=None)
    extrude(amount=-BOSS_EXTRUDE6_DEPTH)

    # Clearance Hole2 (through all)
    with Locations(Plane(origin=(0, 0, 0), x_dir=(1, 0, 0), z_dir=(0, 1, 0))):
        with Locations((-9.525, 188), (9.525, 188)):
            Hole(CLEARANCE_HOLE2_D / 2)

    # Fillet2
    fillet2_edges = [part.edges().sort_by_distance(p)[0] for p in [
        (176.905, -0.75946, 160),
        (-176.905, -0.75946, 160),
        (176.905, -0.75946, -177),
        (42.952595893, -0.75946, -120),
        (99.905, -0.75946, -120),
        (156.905, -0.75946, -177),
        (176.905, -0.75946, 120),
        (176.905, -0.75946, -137),
        (120, -0.75946, -80.095),
        (120, -0.75946, 63.095),
        (-176.905, -0.75946, -137),
        (-176.905, -0.75946, 120),
        (-120, -0.75946, 63.095),
        (-120, -0.75946, -80.095),
        (-176.905, -0.75946, -177),
        (-156.905, -0.75946, -177),
        (-99.905, -0.75946, -120),
        (-42.952595893, -0.75946, -120),
        (-156.905, -0.75946, 160),
        (156.905, -0.75946, 160),
        (116.905, -0.75946, 120),
        (-116.905, -0.75946, 120),
        (-23.124355653, -0.75946, -194),
        (23.124355653, -0.75946, -194),
    ]]
    fillet(fillet2_edges, radius=FILLET2_R)


solid = part.part
